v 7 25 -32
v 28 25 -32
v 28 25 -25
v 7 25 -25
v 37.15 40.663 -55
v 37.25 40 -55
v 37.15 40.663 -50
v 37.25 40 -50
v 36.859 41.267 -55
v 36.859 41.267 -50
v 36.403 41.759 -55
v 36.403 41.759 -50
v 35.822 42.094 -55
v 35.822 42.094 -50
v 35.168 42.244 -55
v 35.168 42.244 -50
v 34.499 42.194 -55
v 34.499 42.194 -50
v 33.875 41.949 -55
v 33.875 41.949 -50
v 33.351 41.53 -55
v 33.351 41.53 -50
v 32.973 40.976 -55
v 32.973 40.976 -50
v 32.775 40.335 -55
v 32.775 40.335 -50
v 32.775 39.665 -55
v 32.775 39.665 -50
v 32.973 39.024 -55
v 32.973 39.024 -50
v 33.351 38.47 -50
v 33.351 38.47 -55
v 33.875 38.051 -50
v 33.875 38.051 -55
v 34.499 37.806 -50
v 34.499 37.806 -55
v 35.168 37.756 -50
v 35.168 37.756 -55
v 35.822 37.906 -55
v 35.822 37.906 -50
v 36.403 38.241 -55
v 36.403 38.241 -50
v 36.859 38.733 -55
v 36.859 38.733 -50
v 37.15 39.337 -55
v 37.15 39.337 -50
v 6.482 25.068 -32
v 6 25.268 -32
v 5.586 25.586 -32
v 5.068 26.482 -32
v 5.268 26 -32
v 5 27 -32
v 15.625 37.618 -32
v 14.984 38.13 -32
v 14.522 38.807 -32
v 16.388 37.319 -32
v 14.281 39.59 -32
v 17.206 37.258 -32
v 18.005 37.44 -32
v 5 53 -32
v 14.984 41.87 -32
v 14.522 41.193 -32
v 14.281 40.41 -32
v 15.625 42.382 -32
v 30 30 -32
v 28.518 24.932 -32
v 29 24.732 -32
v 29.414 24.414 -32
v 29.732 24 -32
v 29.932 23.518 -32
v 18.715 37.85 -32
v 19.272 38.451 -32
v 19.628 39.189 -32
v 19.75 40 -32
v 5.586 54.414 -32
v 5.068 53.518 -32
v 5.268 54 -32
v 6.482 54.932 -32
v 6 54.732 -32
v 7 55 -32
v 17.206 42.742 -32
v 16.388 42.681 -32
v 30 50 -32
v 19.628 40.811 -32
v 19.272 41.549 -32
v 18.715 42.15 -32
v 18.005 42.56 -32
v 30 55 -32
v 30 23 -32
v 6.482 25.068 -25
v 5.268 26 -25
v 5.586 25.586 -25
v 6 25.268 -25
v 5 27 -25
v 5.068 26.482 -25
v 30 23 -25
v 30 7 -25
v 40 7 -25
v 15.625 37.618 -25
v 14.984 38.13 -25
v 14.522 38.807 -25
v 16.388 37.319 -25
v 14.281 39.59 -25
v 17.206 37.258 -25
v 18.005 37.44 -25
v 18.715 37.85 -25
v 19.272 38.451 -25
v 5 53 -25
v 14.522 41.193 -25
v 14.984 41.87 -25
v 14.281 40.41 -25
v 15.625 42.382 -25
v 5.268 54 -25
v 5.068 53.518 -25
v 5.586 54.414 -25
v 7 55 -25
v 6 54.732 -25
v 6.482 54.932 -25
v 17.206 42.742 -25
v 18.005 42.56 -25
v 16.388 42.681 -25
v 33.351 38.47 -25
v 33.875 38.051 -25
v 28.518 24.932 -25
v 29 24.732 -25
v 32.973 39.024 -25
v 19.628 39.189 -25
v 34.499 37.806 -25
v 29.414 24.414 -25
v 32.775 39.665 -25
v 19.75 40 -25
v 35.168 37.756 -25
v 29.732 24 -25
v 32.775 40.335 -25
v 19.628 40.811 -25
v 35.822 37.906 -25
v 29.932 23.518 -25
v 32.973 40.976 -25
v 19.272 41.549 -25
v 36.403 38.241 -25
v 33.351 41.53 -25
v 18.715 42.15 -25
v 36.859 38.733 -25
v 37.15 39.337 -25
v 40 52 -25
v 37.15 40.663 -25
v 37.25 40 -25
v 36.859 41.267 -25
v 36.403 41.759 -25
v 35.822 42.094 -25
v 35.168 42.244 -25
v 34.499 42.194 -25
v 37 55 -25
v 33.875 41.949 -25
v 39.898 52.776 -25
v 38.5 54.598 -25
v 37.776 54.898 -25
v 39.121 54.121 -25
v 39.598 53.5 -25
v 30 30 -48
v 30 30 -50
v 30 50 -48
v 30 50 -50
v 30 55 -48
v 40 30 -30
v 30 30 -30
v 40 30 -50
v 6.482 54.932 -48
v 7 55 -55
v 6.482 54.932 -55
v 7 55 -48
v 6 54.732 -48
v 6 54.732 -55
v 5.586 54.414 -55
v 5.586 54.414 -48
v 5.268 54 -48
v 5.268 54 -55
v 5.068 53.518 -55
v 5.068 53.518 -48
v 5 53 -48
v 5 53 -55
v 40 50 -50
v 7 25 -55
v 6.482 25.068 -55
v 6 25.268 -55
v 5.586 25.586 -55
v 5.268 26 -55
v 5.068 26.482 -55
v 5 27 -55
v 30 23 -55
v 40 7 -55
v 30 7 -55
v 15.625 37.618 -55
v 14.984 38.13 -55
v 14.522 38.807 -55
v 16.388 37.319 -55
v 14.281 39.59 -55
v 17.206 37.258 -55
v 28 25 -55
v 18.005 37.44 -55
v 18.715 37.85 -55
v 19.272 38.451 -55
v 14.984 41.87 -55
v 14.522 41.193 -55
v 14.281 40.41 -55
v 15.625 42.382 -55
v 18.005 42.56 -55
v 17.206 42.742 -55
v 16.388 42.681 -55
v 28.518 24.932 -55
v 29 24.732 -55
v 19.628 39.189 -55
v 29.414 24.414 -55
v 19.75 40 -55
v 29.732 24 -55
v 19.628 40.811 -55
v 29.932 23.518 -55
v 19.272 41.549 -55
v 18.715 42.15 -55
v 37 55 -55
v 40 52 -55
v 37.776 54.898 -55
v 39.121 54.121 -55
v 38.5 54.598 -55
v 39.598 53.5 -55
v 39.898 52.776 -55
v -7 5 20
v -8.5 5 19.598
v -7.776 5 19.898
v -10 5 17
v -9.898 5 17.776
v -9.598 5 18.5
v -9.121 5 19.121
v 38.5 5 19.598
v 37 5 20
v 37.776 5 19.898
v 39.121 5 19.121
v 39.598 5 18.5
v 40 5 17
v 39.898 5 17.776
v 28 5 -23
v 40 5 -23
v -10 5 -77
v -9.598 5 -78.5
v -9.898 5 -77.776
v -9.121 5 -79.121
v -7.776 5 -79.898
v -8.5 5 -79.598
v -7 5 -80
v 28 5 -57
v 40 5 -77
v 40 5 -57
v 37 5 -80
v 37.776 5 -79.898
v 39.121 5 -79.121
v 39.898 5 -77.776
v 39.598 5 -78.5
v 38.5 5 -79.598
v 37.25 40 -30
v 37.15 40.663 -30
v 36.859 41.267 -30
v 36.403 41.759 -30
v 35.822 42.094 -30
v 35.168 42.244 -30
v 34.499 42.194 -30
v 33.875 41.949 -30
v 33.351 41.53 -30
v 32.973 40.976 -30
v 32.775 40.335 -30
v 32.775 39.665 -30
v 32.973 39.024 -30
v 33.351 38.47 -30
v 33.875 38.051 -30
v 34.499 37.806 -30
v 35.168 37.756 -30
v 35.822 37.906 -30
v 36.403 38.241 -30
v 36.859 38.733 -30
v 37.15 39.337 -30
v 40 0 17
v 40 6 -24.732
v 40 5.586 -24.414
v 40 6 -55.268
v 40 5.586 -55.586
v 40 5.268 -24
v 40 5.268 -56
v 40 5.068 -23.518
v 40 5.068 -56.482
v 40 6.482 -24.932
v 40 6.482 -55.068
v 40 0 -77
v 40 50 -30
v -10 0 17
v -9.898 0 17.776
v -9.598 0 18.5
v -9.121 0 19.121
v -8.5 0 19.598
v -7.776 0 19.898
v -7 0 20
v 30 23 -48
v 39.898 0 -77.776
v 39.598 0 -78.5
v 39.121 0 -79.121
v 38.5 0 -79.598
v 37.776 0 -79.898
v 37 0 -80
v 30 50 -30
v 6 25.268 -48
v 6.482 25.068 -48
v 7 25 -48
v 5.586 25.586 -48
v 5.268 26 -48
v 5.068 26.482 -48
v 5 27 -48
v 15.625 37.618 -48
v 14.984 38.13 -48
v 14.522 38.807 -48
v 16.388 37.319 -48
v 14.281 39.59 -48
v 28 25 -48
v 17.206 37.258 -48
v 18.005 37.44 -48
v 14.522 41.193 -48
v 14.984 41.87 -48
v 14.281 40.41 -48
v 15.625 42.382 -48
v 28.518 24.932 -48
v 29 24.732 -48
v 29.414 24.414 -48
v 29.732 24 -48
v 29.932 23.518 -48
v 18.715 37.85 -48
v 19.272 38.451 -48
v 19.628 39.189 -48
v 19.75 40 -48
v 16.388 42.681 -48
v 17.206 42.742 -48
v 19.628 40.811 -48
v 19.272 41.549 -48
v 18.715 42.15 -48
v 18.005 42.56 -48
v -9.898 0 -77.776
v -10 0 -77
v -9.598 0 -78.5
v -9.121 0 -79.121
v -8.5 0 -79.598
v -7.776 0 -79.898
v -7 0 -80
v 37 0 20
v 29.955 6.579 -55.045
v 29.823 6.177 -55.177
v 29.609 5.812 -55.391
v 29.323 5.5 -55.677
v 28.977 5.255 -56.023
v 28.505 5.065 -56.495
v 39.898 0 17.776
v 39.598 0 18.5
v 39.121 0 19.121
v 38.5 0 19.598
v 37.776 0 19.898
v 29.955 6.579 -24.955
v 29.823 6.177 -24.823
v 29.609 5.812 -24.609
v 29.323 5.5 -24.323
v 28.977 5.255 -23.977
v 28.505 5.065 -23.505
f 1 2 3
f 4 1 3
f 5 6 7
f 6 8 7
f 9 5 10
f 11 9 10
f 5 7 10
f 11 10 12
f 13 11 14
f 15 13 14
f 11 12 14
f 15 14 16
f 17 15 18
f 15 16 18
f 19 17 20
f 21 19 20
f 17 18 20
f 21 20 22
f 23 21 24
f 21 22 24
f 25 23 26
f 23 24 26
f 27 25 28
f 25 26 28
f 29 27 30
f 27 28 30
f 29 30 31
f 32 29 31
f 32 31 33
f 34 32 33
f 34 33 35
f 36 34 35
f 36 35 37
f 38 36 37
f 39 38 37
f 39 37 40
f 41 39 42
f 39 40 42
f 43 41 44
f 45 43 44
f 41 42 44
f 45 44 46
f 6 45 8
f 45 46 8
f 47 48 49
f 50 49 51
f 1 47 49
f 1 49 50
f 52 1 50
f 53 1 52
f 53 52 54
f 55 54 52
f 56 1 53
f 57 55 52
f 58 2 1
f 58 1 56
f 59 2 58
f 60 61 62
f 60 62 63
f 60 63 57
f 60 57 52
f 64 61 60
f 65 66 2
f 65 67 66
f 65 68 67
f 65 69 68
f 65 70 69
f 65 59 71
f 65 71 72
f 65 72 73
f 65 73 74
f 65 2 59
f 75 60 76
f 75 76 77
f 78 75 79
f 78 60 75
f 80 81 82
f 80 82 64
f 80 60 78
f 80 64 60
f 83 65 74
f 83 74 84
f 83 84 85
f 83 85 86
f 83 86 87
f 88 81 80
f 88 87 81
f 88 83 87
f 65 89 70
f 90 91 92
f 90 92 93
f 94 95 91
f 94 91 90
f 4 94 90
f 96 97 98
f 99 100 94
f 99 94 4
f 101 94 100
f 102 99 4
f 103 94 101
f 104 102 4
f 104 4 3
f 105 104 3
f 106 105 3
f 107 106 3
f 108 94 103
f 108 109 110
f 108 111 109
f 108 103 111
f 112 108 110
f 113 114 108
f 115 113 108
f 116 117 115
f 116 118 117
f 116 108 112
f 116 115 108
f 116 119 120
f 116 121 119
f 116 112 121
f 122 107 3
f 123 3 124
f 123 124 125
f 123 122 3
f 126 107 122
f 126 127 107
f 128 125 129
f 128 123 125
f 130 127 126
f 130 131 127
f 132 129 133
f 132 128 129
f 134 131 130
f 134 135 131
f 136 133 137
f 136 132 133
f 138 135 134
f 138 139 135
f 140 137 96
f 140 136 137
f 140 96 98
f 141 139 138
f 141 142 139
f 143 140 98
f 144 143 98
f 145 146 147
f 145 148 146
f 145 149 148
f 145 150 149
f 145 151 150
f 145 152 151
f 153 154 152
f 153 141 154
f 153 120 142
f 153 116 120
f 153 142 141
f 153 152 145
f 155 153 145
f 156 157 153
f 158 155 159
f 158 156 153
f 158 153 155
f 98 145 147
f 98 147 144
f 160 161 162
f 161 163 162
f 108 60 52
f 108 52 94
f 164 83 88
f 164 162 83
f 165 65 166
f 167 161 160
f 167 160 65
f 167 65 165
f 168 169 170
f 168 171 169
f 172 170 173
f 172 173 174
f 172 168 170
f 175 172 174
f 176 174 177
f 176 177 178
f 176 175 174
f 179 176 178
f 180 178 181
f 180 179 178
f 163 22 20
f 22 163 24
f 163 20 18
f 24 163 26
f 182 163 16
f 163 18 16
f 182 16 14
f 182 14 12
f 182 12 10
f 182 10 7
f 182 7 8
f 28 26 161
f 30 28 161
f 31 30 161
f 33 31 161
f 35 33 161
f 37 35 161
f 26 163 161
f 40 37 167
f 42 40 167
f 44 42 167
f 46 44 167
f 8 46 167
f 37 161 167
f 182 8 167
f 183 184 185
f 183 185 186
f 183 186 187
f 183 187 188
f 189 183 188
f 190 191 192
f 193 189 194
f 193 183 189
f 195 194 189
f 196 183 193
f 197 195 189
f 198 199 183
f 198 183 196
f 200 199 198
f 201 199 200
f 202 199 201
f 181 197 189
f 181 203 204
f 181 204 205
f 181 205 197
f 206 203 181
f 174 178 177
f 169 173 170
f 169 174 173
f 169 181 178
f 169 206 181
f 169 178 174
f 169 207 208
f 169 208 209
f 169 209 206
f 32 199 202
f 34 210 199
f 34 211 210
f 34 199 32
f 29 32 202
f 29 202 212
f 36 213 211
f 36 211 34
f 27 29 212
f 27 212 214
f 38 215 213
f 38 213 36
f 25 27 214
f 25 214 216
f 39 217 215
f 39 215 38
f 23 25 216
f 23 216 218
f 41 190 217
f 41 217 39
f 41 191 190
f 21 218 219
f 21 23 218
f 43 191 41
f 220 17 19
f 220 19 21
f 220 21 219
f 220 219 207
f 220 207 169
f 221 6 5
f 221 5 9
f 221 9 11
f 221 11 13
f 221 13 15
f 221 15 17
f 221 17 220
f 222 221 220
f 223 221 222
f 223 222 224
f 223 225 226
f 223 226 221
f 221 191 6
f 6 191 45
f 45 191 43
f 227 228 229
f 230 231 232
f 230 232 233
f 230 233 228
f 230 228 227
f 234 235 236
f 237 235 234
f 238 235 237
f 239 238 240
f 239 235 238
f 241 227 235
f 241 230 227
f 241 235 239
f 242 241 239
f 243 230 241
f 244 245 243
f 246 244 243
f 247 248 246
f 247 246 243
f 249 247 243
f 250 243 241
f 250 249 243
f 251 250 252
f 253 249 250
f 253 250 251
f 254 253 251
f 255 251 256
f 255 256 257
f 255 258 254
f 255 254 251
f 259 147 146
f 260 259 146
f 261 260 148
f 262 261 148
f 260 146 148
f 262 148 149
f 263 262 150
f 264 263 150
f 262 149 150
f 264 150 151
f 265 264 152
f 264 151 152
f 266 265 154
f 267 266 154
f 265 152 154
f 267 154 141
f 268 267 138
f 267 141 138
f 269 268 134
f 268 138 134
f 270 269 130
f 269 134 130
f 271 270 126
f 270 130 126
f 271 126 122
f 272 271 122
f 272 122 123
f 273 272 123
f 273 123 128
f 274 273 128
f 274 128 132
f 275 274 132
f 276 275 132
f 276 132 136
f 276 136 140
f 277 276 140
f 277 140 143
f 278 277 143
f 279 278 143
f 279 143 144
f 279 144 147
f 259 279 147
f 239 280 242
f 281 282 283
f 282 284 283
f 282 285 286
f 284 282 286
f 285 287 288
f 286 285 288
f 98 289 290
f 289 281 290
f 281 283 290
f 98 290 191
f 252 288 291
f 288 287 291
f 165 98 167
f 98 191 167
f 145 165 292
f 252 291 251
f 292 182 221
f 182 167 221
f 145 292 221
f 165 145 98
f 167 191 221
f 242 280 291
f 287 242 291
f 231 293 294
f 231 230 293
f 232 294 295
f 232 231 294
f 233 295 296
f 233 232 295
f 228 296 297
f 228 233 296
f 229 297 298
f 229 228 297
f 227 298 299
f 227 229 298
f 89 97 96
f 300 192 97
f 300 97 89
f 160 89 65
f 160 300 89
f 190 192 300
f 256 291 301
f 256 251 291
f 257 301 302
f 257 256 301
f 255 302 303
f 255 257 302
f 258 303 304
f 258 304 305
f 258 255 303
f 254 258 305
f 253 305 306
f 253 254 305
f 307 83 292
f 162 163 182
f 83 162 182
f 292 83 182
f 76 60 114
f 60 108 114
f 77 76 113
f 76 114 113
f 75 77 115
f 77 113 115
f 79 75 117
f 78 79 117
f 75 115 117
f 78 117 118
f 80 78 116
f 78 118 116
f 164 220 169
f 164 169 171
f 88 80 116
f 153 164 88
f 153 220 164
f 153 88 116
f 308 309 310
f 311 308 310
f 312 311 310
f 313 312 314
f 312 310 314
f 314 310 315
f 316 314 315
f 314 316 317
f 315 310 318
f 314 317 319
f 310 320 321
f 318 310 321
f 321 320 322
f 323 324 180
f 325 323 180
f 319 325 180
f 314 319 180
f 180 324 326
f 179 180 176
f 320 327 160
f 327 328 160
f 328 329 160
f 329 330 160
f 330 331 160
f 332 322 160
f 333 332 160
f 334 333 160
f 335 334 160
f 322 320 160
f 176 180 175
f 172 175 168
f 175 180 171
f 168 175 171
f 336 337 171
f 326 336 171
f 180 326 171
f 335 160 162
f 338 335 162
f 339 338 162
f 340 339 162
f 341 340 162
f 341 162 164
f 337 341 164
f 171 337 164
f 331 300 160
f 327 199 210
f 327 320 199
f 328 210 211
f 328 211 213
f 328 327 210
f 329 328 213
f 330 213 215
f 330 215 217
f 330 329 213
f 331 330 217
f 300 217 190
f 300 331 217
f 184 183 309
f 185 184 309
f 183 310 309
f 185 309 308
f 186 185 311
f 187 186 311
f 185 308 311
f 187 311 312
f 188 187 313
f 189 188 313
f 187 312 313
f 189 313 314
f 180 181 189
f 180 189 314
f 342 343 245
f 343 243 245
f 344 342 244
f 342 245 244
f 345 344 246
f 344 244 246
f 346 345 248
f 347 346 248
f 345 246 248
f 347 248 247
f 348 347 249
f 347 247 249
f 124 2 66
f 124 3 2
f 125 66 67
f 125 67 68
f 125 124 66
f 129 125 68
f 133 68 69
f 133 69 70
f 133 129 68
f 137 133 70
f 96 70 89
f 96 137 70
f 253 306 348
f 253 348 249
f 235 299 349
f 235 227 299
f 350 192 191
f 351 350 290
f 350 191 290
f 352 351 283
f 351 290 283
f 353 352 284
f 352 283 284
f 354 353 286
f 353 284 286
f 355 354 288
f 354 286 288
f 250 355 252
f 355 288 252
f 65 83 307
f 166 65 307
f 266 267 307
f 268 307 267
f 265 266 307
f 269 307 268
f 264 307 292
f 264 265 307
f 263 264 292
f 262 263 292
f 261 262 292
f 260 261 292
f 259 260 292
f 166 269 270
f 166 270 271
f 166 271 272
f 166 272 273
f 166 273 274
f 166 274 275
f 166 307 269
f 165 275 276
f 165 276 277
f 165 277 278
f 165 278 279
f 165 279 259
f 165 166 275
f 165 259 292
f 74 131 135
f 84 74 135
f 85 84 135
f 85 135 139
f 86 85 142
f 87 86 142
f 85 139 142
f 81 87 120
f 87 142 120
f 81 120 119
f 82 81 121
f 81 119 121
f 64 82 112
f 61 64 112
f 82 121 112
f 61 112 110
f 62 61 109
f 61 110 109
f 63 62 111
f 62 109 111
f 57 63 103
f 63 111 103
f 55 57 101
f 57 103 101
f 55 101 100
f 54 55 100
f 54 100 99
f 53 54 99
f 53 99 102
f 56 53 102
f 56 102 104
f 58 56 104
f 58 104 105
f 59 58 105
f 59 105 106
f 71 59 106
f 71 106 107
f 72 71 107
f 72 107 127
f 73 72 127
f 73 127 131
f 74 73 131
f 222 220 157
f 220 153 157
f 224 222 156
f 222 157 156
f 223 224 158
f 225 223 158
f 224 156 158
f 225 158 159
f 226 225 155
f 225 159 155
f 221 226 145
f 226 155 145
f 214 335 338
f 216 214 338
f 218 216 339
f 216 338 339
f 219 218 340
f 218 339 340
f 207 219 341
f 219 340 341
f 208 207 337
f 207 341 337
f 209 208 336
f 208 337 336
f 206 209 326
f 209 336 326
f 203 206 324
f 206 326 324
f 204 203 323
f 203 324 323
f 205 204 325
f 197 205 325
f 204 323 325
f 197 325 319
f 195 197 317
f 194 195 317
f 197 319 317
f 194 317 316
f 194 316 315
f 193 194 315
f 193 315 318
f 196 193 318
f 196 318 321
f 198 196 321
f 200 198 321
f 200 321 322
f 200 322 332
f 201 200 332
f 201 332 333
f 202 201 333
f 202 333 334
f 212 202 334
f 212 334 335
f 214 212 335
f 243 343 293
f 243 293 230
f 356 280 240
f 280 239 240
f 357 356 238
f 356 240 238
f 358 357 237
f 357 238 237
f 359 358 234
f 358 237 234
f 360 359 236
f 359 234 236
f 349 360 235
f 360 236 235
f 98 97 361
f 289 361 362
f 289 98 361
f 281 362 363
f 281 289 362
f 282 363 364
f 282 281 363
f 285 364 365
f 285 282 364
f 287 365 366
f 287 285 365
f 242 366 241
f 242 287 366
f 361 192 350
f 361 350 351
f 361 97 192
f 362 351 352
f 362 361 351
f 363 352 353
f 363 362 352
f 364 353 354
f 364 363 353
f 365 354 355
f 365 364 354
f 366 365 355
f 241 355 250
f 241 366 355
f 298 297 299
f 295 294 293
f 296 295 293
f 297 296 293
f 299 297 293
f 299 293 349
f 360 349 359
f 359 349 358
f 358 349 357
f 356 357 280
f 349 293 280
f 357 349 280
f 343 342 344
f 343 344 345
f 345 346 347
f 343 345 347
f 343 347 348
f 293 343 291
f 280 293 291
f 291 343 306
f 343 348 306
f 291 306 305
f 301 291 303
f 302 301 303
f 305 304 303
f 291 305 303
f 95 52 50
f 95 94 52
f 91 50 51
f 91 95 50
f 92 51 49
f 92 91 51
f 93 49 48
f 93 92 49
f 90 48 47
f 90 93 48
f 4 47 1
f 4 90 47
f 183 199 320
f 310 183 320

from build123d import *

# Parameters (mm, degrees)
SKETCH4_W            = 40
SKETCH4_H            = 80
BOSS_EXTRUDE4_DEPTH  = 5
SKETCH5_W            = 10
SKETCH5_H            = 5
BOSS_EXTRUDE6_DEPTH  = 50
SKETCH7_W            = 10
SKETCH7_H            = 25
SKETCH7_H_2          = 5
BOSS_EXTRUDE7_DEPTH  = 20
SKETCH9_W            = 80
SKETCH9_H            = 5
BOSS_EXTRUDE9_DEPTH  = 10
SKETCH10_W           = 50
SKETCH10_H           = 5
BOSS_EXTRUDE10_DEPTH = 20
SKETCH11_R           = 2.25
CUT_EXTRUDE1_DEPTH   = 25
SKETCH12_R           = 4
SKETCH12_R_2         = 2.25
CUT_EXTRUDE2_DEPTH   = 2
SKETCH15_W           = 7
SKETCH15_H           = 30
BOSS_EXTRUDE11_DEPTH = 20
CUT_EXTRUDE4_REACH   = 89.464
SKETCH16_R           = 2.75
FILLET3_R            = 3
SKETCH19_W           = 7
SKETCH19_H           = 30
BOSS_EXTRUDE12_DEPTH = 5
FILLET4_R            = 2
BOSS_EXTRUDE13_START = 2
SKETCH20_R           = 4
SKETCH20_R_2         = 2.25
BOSS_EXTRUDE13_DEPTH = 2


with BuildPart() as part:
    # Sketch4 → Boss-Extrude4 (new body)
    with BuildSketch(Plane(origin=(0, 0, 0), x_dir=(1, 0, 0), z_dir=(0, 1, 0))):
        with Locations((20, 40)):
            Rectangle(SKETCH4_W, SKETCH4_H)
    extrude(amount=BOSS_EXTRUDE4_DEPTH)

    # Sketch5 → Boss-Extrude6 (add)
    with BuildSketch(Plane(origin=(0, 5, 0), x_dir=(1, 0, 0), z_dir=(0, 1, 0))):
        with Locations((35, 52.5)):
            Rectangle(SKETCH5_W, SKETCH5_H)
        with Locations((35, 27.5)):
            Rectangle(SKETCH5_W, SKETCH5_H)
    extrude(amount=BOSS_EXTRUDE6_DEPTH)

    # Sketch7 → Boss-Extrude7 (add)
    with BuildSketch(Plane.XY.offset(-50)):
        with Locations((35, 17.5)):
            Rectangle(SKETCH7_W, SKETCH7_H)
        with Locations((35, 52.5)):
            Rectangle(SKETCH7_W, SKETCH7_H_2)
    extrude(amount=BOSS_EXTRUDE7_DEPTH)

    # Sketch9 → Boss-Extrude9 (add)
    with BuildSketch(Plane.ZY):
        with Locations((-40, 2.5)):
            Rectangle(SKETCH9_W, SKETCH9_H)
    extrude(amount=BOSS_EXTRUDE9_DEPTH)

    # Sketch10 → Boss-Extrude10 (add)
    with BuildSketch(Plane.XY):
        with Locations((15, 2.5)):
            Rectangle(SKETCH10_W, SKETCH10_H)
    extrude(amount=BOSS_EXTRUDE10_DEPTH)

    # Sketch11 → Cut-Extrude1 (cut, symmetric)
    with BuildSketch(Plane.XY.offset(-50)):
        with Locations((35, 40)):
            Circle(SKETCH11_R)
    extrude(amount=CUT_EXTRUDE1_DEPTH, both=True, mode=Mode.SUBTRACT)

    # Sketch12 → Cut-Extrude2 (cut)
    with BuildSketch(Plane.XY.offset(-25)):
        with Locations((35, 40)):
            Circle(SKETCH12_R)
        with Locations((35, 40)):
            Circle(SKETCH12_R_2, mode=Mode.SUBTRACT)
    extrude(amount=-CUT_EXTRUDE2_DEPTH, mode=Mode.SUBTRACT)

    # Sketch15 → Boss-Extrude11 (add)
    with BuildSketch(Plane.ZY.offset(-30)):
        with Locations((-51.5, 40)):
            Rectangle(SKETCH15_W, SKETCH15_H)
        with Locations((-28.5, 40)):
            Rectangle(SKETCH15_W, SKETCH15_H)
    extrude(amount=BOSS_EXTRUDE11_DEPTH)

    # Cut-Extrude4: up to this face of the body (flat: up to its plane)
    cut_extrude4_end = Plane(part.part.faces().sort_by_distance((26.698149798, 35.387860999, -55))[0])
    # Sketch16 → Cut-Extrude4 (cut, up to the picked face)
    with BuildSketch(Plane.XY.offset(-25), mode=Mode.PRIVATE) as cut_extrude4_sk1:
        with Locations((17, 40)):
            Circle(SKETCH16_R)
    cut_extrude4_tool1 = split(extrude(cut_extrude4_sk1.sketch, amount=-CUT_EXTRUDE4_REACH, mode=Mode.PRIVATE), bisect_by=cut_extrude4_end, keep=Keep.BOTH, mode=Mode.PRIVATE)
    add(cut_extrude4_tool1.solids().sort_by(Axis((17, 40, -25), (0, 0, -1)))[0], mode=Mode.SUBTRACT)

    # Fillet3
    fillet3_edges = [part.edges().sort_by_distance(p)[0] for p in [
        (40, 55, -40),
        (-10, 2.5, -80),
        (40, 2.5, -80),
        (-10, 2.5, 20),
        (40, 2.5, 20),
    ]]
    fillet(fillet3_edges, radius=FILLET3_R)

    # Sketch19 → Boss-Extrude12 (add)
    with BuildSketch(Plane.ZY.offset(-10)):
        with Locations((-51.5, 40)):
            Rectangle(SKETCH19_W, SKETCH19_H)
        with Locations((-28.5, 40)):
            Rectangle(SKETCH19_W, SKETCH19_H)
    extrude(amount=BOSS_EXTRUDE12_DEPTH)

    # Fillet4
    fillet4_edges = [part.edges().sort_by_distance(p)[0] for p in [
        (30, 25, -51.5),
        (30, 25, -28.5),
        (35, 5, -55),
        (30, 5, -40),
        (5, 55, -51.5),
        (5, 25, -51.5),
        (5, 25, -28.5),
        (5, 55, -28.5),
        (35, 5, -25),
    ]]
    fillet(fillet4_edges, radius=FILLET4_R)

    # Sketch20 → Boss-Extrude13 (add)
    with BuildSketch(Plane.XY.offset(-27).offset(BOSS_EXTRUDE13_START)):
        with Locations((35, 40)):
            Circle(SKETCH20_R)
        with Locations((35, 40)):
            Circle(SKETCH20_R_2, mode=Mode.SUBTRACT)
    extrude(amount=-BOSS_EXTRUDE13_DEPTH)


solid = part.part
